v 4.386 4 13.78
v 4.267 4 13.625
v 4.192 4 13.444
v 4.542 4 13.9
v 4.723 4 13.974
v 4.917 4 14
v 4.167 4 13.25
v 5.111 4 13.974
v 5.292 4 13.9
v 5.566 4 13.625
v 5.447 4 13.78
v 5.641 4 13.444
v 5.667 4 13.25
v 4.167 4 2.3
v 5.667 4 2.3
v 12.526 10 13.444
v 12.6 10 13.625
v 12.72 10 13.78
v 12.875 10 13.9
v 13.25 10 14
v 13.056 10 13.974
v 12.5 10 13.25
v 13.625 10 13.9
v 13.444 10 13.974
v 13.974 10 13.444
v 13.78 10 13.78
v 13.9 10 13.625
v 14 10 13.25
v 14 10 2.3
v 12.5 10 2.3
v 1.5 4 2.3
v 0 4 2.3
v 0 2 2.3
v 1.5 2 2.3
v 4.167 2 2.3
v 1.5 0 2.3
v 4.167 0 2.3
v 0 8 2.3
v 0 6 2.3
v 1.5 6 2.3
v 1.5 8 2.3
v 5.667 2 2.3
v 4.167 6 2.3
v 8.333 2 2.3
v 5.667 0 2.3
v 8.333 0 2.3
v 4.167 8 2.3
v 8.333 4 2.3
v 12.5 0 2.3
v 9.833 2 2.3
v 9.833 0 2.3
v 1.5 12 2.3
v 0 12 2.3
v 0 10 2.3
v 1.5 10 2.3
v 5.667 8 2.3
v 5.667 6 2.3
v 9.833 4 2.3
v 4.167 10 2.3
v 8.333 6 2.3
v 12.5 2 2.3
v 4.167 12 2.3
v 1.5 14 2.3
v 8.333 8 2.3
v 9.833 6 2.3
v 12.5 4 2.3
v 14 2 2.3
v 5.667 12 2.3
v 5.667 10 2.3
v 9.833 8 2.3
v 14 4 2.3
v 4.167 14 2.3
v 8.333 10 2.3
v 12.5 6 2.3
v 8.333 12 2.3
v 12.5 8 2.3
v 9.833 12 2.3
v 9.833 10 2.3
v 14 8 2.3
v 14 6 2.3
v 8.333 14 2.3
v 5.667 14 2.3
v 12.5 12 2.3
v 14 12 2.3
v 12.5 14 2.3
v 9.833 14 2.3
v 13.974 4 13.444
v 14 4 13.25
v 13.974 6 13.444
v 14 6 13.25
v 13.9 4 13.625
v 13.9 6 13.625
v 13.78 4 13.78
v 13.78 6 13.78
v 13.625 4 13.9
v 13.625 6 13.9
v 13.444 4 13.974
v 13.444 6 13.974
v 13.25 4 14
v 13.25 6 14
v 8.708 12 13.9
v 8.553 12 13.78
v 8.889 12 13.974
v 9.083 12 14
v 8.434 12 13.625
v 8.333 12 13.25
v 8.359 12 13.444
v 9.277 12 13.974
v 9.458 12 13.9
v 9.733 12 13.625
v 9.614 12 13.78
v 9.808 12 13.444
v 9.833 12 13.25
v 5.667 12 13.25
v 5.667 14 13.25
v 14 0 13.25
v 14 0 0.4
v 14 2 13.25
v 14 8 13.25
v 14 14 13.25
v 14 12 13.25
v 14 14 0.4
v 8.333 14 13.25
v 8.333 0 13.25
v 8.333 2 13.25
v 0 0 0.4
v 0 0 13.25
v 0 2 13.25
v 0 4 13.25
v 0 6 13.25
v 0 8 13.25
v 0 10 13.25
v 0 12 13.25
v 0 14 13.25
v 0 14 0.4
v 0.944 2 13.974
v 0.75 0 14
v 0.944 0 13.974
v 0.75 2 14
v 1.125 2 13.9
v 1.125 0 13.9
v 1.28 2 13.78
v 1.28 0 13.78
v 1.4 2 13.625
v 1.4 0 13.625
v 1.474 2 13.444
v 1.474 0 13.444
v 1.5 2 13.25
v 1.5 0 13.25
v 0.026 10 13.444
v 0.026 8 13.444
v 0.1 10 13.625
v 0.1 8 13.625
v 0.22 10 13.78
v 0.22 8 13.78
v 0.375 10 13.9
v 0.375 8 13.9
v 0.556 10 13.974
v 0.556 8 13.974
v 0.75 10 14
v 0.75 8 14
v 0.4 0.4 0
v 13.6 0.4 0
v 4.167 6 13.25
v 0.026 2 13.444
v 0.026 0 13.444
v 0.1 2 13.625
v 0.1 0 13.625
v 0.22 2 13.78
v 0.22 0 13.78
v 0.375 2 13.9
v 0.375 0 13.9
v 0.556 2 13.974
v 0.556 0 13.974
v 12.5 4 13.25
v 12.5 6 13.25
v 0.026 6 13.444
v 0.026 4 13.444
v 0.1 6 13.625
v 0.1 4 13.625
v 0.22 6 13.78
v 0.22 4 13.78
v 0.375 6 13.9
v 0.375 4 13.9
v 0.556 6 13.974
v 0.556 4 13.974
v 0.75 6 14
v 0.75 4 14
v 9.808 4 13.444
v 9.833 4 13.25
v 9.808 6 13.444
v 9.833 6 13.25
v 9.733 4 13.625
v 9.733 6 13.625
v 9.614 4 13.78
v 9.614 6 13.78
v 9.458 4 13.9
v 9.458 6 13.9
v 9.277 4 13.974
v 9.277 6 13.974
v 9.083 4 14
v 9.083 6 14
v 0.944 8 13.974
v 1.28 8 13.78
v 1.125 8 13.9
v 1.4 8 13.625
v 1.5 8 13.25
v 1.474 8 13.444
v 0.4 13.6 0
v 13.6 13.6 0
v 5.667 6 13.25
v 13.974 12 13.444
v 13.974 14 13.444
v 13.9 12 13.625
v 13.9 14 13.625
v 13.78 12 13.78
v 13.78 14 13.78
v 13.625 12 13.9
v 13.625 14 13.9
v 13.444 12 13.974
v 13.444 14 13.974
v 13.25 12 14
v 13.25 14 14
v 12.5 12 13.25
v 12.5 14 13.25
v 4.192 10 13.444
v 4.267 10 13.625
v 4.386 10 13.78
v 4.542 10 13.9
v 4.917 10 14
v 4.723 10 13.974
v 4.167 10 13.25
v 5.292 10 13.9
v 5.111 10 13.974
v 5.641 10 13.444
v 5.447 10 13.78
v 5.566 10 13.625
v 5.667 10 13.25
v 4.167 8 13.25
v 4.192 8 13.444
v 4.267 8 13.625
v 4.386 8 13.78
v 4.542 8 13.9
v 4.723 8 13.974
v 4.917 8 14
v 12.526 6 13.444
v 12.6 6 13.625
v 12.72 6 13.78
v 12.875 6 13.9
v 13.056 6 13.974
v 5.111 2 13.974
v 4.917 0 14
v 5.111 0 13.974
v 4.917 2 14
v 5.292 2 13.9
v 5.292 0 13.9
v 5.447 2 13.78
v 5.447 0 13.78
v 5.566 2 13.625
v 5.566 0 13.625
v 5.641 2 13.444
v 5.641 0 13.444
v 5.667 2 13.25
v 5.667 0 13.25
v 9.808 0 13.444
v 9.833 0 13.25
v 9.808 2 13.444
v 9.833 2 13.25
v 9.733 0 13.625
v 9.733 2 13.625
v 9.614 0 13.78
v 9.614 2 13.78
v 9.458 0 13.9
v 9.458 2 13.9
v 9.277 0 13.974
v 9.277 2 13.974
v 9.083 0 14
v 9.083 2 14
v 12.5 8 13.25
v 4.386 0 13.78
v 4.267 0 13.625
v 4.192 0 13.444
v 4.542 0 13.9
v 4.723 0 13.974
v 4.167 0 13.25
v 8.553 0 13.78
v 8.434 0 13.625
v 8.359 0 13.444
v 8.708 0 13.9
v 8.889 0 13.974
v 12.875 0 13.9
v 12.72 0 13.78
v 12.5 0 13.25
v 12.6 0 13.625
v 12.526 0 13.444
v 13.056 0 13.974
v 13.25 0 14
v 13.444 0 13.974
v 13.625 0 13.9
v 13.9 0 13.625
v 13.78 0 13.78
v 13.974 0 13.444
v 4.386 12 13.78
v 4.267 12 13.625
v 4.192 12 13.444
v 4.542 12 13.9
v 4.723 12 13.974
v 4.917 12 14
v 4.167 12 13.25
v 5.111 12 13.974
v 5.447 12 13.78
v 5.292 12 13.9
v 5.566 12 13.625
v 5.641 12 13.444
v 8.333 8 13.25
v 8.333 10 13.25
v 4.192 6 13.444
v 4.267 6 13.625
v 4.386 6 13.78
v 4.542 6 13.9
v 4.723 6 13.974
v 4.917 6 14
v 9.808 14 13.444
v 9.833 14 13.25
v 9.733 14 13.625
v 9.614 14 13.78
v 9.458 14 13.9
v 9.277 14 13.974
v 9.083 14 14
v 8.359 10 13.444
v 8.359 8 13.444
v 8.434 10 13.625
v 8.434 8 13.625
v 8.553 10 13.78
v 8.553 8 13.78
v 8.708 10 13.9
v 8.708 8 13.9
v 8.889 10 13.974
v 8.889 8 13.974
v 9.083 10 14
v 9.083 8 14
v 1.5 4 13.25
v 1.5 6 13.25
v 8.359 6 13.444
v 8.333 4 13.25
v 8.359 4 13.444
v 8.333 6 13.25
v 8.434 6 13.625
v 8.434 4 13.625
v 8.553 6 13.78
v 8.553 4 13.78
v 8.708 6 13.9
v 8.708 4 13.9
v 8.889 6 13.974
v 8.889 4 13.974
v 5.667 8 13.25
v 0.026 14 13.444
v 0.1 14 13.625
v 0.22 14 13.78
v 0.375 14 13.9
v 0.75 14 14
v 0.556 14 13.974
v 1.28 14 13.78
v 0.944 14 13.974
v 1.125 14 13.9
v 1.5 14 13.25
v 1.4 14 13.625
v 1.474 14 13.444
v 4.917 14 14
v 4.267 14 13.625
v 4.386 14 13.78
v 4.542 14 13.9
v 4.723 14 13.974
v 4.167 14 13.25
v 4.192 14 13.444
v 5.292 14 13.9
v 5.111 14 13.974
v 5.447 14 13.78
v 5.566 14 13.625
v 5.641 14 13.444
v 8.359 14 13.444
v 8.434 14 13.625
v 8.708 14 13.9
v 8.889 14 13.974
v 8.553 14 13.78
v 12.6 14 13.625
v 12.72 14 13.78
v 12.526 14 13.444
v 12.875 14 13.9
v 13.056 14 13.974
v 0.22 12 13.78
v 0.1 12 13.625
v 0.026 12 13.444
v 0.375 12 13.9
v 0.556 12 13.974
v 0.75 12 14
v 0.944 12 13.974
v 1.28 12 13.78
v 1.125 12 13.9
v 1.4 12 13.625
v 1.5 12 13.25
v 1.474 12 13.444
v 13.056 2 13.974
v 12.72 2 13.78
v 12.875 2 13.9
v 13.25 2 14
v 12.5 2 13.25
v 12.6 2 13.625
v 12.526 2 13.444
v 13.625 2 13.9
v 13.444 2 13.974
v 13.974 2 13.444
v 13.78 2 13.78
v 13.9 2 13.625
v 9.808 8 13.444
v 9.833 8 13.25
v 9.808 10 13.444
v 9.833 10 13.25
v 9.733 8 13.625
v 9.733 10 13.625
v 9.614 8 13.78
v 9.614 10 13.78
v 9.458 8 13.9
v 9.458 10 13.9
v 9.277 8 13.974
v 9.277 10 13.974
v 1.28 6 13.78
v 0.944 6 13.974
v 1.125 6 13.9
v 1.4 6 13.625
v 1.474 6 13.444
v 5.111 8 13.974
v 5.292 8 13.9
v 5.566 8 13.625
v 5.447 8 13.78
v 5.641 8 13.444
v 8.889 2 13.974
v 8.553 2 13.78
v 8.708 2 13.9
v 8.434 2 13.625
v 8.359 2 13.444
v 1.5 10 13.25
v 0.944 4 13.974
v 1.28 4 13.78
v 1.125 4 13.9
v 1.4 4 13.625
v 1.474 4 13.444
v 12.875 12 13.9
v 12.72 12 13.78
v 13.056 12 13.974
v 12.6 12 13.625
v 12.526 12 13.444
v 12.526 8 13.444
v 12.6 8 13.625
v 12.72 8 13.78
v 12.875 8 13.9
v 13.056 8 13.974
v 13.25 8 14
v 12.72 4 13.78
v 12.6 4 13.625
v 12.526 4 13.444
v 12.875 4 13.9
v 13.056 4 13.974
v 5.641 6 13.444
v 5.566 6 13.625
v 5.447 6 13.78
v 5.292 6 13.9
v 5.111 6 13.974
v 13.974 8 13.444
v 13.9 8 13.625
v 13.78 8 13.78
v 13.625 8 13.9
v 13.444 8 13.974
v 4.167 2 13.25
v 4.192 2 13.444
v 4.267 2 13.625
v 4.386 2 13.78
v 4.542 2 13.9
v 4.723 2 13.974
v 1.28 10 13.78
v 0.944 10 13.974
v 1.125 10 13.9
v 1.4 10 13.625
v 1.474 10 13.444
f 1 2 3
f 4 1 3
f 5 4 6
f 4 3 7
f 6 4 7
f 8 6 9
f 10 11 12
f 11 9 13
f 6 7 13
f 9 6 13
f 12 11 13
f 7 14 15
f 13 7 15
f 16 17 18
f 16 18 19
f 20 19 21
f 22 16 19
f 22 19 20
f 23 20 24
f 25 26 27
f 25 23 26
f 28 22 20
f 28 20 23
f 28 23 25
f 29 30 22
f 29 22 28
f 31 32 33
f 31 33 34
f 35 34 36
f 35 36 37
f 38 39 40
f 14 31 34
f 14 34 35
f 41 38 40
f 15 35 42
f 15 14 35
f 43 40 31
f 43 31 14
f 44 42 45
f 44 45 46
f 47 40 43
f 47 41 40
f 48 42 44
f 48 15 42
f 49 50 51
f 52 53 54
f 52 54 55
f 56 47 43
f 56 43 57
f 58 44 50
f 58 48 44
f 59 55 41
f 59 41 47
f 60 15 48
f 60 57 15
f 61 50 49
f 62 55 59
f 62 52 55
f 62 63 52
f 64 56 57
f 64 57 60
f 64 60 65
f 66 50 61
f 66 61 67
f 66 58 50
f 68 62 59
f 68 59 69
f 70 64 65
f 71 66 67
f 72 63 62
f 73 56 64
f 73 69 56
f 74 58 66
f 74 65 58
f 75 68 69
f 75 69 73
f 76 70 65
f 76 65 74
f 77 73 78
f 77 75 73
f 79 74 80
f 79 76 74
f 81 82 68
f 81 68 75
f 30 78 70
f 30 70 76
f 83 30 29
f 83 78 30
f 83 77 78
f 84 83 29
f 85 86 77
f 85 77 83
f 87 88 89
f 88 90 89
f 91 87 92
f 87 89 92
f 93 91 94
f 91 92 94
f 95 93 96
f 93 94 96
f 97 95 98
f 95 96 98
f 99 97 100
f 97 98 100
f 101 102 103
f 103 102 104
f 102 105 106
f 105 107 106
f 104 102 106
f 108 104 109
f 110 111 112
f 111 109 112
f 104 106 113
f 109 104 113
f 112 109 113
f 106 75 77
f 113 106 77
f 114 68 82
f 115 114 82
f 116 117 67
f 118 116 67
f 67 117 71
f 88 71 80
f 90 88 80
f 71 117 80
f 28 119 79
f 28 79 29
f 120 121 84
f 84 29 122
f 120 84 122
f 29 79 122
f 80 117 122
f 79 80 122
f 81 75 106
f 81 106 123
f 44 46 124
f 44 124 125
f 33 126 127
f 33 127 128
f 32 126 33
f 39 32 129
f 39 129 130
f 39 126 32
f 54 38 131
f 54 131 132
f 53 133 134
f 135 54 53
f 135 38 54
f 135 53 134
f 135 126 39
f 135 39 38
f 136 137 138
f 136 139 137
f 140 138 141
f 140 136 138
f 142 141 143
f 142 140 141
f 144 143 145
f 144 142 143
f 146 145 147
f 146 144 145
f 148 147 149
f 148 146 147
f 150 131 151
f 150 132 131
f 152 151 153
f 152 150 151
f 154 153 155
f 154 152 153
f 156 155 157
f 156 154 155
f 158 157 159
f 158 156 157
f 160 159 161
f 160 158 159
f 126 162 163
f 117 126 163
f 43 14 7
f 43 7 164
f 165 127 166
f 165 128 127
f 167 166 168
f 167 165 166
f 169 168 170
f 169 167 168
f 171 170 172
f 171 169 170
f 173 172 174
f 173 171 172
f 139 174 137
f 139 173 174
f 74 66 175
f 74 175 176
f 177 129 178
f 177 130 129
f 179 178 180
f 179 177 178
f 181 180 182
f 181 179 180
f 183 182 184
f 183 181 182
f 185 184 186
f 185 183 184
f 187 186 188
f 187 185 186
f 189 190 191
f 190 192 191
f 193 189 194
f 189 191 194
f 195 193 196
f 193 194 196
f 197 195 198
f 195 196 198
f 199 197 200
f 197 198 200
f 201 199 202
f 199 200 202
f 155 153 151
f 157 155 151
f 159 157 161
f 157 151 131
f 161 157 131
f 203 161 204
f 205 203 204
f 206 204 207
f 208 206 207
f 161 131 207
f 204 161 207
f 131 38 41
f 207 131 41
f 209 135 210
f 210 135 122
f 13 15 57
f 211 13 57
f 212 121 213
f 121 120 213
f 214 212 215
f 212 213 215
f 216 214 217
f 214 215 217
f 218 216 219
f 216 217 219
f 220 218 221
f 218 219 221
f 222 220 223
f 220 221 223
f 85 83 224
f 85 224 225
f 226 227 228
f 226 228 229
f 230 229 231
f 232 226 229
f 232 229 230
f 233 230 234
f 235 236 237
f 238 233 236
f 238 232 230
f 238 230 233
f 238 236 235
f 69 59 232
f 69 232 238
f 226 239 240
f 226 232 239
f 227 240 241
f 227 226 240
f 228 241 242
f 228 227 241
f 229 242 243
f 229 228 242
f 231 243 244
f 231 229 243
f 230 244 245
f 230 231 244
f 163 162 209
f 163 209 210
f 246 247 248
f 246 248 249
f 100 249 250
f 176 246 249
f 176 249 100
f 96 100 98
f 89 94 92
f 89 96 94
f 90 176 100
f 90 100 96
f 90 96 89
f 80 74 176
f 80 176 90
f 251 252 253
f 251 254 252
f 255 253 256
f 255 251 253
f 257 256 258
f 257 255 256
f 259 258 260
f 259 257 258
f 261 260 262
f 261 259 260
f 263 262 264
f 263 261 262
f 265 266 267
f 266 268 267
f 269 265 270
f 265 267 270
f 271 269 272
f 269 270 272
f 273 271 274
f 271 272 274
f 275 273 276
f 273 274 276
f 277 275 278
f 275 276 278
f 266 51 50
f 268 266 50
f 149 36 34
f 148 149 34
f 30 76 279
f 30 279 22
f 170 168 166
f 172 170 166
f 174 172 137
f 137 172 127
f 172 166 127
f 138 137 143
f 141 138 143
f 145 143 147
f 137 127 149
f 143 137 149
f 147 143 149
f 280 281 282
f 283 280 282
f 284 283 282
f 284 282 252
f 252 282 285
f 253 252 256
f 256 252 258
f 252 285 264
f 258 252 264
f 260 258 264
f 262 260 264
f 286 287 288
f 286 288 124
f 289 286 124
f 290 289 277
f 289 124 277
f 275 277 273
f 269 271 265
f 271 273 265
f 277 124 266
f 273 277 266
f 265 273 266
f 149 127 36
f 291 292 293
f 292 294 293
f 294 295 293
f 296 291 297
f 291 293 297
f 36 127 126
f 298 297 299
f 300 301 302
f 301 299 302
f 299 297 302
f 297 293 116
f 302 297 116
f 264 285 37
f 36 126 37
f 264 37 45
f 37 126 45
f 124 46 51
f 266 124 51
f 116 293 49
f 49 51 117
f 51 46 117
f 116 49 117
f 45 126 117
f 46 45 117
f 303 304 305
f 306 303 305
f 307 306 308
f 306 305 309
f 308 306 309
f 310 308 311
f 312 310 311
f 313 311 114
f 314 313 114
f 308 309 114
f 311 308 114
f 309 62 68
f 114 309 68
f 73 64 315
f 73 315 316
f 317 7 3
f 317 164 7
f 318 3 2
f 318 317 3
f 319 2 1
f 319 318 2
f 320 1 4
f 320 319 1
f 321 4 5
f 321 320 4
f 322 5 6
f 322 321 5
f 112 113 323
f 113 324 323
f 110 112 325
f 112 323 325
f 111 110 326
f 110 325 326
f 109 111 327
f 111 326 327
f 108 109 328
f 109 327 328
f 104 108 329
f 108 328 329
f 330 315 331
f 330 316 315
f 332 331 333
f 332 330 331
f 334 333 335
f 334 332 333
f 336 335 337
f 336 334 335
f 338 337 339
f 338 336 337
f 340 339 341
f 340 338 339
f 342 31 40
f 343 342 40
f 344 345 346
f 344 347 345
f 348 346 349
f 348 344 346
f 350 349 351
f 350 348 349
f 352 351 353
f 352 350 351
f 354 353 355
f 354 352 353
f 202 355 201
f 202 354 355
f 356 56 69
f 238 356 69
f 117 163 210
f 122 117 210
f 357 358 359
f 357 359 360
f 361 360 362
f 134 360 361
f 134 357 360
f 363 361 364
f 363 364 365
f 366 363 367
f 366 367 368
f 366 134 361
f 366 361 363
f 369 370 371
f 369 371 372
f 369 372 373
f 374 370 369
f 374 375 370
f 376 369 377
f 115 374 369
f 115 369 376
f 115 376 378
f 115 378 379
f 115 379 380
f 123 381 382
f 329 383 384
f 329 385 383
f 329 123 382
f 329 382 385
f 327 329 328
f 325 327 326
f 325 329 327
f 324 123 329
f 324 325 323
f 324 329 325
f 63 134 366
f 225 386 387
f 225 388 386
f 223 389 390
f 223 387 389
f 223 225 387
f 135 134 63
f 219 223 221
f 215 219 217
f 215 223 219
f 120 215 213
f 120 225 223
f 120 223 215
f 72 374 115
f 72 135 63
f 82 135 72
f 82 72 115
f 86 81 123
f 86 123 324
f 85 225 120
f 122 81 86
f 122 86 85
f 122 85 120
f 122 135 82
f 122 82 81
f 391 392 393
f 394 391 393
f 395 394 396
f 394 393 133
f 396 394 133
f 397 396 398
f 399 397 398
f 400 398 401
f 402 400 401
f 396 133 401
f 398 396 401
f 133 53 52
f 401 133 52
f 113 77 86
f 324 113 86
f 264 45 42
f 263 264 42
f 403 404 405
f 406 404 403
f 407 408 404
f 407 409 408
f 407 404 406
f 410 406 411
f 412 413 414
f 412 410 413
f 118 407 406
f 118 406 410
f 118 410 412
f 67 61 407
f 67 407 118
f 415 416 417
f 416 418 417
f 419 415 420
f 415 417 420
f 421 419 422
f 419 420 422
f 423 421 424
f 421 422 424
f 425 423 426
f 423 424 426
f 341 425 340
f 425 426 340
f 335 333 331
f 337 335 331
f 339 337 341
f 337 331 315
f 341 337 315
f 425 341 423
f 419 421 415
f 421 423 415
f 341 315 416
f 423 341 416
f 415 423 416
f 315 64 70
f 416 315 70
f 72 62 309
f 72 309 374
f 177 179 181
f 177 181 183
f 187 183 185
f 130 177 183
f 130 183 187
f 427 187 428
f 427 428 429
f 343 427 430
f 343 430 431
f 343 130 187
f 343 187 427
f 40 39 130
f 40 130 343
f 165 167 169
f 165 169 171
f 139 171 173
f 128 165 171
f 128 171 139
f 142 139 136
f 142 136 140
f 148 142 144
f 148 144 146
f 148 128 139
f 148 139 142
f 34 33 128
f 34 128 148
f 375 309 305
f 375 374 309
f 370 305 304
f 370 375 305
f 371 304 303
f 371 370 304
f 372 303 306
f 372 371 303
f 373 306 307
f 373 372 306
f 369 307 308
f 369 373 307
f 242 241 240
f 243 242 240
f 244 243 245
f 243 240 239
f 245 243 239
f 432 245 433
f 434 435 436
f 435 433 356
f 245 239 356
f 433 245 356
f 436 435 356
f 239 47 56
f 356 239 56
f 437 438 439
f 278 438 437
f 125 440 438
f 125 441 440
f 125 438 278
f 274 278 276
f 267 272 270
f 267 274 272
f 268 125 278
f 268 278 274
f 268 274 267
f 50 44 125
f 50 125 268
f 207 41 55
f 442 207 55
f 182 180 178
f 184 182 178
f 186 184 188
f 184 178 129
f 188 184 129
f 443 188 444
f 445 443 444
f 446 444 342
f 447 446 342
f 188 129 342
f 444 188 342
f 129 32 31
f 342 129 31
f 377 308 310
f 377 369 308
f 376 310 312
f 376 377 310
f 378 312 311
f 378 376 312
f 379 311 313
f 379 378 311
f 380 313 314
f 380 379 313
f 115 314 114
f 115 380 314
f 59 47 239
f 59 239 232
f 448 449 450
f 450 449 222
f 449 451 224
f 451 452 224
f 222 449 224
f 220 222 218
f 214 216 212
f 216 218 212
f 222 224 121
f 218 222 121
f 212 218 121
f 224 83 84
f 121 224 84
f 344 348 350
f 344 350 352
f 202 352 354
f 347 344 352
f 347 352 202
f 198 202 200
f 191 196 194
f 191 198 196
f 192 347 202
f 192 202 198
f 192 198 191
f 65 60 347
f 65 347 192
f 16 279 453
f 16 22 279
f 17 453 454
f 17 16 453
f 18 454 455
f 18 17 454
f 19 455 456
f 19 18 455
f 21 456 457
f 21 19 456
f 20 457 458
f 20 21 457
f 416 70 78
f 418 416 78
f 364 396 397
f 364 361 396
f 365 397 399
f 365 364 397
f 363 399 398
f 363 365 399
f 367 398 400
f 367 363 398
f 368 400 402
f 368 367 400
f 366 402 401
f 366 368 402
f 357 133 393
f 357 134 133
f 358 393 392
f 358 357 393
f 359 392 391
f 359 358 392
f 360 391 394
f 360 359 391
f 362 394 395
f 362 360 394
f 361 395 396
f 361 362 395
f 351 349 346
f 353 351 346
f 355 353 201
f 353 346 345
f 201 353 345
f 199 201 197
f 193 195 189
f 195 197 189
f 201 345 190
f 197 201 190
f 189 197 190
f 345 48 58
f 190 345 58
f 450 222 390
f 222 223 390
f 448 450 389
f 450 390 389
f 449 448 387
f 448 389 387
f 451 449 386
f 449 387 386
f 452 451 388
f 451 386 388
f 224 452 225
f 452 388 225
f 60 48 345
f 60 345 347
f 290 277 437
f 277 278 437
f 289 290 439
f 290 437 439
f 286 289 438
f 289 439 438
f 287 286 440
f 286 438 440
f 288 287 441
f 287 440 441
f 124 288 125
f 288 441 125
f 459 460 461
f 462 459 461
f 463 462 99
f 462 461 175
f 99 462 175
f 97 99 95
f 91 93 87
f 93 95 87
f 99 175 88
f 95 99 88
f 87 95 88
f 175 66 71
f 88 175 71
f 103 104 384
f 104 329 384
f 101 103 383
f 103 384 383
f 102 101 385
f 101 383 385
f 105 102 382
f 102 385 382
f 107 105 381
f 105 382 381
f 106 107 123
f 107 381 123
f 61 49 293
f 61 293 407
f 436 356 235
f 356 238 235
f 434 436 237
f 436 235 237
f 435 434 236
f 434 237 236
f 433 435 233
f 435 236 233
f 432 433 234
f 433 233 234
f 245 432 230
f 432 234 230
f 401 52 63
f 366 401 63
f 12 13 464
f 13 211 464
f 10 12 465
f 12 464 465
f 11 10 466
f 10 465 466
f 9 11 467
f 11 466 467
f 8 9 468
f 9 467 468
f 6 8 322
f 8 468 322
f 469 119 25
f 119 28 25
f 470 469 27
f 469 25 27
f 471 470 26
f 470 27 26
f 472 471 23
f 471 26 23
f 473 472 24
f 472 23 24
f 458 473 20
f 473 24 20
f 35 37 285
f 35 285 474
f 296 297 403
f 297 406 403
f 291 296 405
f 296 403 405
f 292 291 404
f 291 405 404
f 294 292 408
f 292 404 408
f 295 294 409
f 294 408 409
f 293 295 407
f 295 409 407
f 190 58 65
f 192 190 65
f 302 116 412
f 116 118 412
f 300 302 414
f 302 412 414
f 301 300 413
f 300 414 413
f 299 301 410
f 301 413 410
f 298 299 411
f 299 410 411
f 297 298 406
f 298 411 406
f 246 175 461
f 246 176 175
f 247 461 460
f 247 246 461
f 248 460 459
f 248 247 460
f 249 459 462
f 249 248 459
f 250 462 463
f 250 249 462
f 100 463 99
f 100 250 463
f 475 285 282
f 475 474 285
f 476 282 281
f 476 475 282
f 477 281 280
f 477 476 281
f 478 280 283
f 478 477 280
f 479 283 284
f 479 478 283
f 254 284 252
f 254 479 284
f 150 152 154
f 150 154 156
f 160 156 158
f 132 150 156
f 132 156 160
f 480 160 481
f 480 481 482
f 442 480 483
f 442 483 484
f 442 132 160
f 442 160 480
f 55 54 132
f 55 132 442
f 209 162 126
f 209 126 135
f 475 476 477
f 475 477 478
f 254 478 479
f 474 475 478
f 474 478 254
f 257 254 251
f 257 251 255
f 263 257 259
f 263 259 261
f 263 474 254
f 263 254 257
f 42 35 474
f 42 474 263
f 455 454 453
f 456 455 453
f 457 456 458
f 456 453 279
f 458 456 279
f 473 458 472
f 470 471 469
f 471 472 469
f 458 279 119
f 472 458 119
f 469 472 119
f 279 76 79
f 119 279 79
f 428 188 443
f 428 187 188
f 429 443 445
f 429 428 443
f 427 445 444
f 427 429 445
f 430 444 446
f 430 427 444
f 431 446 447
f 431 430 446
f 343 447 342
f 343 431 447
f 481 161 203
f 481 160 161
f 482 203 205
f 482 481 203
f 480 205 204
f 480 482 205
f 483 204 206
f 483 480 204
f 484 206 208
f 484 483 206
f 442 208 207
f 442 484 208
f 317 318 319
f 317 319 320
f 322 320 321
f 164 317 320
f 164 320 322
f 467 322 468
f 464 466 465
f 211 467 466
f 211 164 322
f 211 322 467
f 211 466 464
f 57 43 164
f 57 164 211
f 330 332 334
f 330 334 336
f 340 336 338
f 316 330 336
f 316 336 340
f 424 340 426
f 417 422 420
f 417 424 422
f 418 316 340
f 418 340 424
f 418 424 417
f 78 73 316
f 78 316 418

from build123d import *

# Parameters (mm, degrees)
F0_W     = 14
F0_H     = 14
F1_DEPTH = 2.3
F2_W     = 1.5
F2_H     = 2
F3_DEPTH = 11.7
F4_SIZE  = 0.4
F5_R     = 0.74999


# Not quite as in the source:
# - a fillet or chamfer is up to 0.001 mm smaller than in the source, because OpenCascade refuses the exact size


with BuildPart() as f1:
    # F0 (on Top) → F1 (new body)
    with BuildSketch(Plane.XY):
        with Locations((7, 7)):
            Rectangle(F0_W, F0_H)
    extrude(amount=F1_DEPTH)

    # F2 (on face) → F3 (join)
    with BuildSketch(Plane.XY.offset(2.3)):
        with Locations((0.75, 13)):
            Rectangle(F2_W, F2_H)
        with Locations((0.75, 1)):
            Rectangle(F2_W, F2_H)
        with Locations((13.25, 13)):
            Rectangle(F2_W, F2_H)
        with Locations((13.25, 1)):
            Rectangle(F2_W, F2_H)
        with Locations((0.75, 9)):
            Rectangle(F2_W, F2_H)
        with Locations((0.75, 5)):
            Rectangle(F2_W, F2_H)
        with Locations((13.25, 9)):
            Rectangle(F2_W, F2_H)
        with Locations((13.25, 5)):
            Rectangle(F2_W, F2_H)
        with Locations((4.9166666667, 9)):
            Rectangle(F2_W, F2_H)
        with Locations((9.0833333333, 9)):
            Rectangle(F2_W, F2_H)
        with Locations((4.9166666667, 13)):
            Rectangle(F2_W, F2_H)
        with Locations((9.0833333333, 13)):
            Rectangle(F2_W, F2_H)
        with Locations((4.9166666667, 5)):
            Rectangle(F2_W, F2_H)
        with Locations((9.0833333333, 5)):
            Rectangle(F2_W, F2_H)
        with Locations((4.9166666667, 1)):
            Rectangle(F2_W, F2_H)
        with Locations((9.0833333333, 1)):
            Rectangle(F2_W, F2_H)
    extrude(amount=F3_DEPTH)

    # F4
    f4_edges = [f1.edges().sort_by_distance(p)[0] for p in [
        (7, 0, 0),
        (0, 7, 0),
        (14, 7, 0),
        (7, 14, 0),
    ]]
    chamfer(f4_edges, length=F4_SIZE)

    # F5 (radius 0.75 in the source; OpenCascade refuses exactly that, so slightly less here)
    f5_edges = [f1.edges().sort_by_distance(p)[0] for p in [
        (14, 13, 14),
        (12.5, 13, 14),
        (9.833333, 13, 14),
        (8.333333, 13, 14),
        (5.666667, 13, 14),
        (4.166667, 13, 14),
        (1.5, 13, 14),
        (0, 13, 14),
        (0, 9, 14),
        (1.5, 9, 14),
        (4.166667, 9, 14),
        (5.666667, 9, 14),
        (8.333333, 9, 14),
        (9.833333, 9, 14),
        (12.5, 9, 14),
        (14, 9, 14),
        (14, 5, 14),
        (12.5, 5, 14),
        (9.833333, 5, 14),
        (8.333333, 5, 14),
        (5.666667, 5, 14),
        (4.166667, 5, 14),
        (1.5, 5, 14),
        (0, 5, 14),
        (0, 1, 14),
        (1.5, 1, 14),
        (4.166667, 1, 14),
        (5.666667, 1, 14),
        (8.333333, 1, 14),
        (9.833333, 1, 14),
        (12.5, 1, 14),
        (14, 1, 14),
    ]]
    fillet(f5_edges, radius=F5_R)


solid = f1.part
